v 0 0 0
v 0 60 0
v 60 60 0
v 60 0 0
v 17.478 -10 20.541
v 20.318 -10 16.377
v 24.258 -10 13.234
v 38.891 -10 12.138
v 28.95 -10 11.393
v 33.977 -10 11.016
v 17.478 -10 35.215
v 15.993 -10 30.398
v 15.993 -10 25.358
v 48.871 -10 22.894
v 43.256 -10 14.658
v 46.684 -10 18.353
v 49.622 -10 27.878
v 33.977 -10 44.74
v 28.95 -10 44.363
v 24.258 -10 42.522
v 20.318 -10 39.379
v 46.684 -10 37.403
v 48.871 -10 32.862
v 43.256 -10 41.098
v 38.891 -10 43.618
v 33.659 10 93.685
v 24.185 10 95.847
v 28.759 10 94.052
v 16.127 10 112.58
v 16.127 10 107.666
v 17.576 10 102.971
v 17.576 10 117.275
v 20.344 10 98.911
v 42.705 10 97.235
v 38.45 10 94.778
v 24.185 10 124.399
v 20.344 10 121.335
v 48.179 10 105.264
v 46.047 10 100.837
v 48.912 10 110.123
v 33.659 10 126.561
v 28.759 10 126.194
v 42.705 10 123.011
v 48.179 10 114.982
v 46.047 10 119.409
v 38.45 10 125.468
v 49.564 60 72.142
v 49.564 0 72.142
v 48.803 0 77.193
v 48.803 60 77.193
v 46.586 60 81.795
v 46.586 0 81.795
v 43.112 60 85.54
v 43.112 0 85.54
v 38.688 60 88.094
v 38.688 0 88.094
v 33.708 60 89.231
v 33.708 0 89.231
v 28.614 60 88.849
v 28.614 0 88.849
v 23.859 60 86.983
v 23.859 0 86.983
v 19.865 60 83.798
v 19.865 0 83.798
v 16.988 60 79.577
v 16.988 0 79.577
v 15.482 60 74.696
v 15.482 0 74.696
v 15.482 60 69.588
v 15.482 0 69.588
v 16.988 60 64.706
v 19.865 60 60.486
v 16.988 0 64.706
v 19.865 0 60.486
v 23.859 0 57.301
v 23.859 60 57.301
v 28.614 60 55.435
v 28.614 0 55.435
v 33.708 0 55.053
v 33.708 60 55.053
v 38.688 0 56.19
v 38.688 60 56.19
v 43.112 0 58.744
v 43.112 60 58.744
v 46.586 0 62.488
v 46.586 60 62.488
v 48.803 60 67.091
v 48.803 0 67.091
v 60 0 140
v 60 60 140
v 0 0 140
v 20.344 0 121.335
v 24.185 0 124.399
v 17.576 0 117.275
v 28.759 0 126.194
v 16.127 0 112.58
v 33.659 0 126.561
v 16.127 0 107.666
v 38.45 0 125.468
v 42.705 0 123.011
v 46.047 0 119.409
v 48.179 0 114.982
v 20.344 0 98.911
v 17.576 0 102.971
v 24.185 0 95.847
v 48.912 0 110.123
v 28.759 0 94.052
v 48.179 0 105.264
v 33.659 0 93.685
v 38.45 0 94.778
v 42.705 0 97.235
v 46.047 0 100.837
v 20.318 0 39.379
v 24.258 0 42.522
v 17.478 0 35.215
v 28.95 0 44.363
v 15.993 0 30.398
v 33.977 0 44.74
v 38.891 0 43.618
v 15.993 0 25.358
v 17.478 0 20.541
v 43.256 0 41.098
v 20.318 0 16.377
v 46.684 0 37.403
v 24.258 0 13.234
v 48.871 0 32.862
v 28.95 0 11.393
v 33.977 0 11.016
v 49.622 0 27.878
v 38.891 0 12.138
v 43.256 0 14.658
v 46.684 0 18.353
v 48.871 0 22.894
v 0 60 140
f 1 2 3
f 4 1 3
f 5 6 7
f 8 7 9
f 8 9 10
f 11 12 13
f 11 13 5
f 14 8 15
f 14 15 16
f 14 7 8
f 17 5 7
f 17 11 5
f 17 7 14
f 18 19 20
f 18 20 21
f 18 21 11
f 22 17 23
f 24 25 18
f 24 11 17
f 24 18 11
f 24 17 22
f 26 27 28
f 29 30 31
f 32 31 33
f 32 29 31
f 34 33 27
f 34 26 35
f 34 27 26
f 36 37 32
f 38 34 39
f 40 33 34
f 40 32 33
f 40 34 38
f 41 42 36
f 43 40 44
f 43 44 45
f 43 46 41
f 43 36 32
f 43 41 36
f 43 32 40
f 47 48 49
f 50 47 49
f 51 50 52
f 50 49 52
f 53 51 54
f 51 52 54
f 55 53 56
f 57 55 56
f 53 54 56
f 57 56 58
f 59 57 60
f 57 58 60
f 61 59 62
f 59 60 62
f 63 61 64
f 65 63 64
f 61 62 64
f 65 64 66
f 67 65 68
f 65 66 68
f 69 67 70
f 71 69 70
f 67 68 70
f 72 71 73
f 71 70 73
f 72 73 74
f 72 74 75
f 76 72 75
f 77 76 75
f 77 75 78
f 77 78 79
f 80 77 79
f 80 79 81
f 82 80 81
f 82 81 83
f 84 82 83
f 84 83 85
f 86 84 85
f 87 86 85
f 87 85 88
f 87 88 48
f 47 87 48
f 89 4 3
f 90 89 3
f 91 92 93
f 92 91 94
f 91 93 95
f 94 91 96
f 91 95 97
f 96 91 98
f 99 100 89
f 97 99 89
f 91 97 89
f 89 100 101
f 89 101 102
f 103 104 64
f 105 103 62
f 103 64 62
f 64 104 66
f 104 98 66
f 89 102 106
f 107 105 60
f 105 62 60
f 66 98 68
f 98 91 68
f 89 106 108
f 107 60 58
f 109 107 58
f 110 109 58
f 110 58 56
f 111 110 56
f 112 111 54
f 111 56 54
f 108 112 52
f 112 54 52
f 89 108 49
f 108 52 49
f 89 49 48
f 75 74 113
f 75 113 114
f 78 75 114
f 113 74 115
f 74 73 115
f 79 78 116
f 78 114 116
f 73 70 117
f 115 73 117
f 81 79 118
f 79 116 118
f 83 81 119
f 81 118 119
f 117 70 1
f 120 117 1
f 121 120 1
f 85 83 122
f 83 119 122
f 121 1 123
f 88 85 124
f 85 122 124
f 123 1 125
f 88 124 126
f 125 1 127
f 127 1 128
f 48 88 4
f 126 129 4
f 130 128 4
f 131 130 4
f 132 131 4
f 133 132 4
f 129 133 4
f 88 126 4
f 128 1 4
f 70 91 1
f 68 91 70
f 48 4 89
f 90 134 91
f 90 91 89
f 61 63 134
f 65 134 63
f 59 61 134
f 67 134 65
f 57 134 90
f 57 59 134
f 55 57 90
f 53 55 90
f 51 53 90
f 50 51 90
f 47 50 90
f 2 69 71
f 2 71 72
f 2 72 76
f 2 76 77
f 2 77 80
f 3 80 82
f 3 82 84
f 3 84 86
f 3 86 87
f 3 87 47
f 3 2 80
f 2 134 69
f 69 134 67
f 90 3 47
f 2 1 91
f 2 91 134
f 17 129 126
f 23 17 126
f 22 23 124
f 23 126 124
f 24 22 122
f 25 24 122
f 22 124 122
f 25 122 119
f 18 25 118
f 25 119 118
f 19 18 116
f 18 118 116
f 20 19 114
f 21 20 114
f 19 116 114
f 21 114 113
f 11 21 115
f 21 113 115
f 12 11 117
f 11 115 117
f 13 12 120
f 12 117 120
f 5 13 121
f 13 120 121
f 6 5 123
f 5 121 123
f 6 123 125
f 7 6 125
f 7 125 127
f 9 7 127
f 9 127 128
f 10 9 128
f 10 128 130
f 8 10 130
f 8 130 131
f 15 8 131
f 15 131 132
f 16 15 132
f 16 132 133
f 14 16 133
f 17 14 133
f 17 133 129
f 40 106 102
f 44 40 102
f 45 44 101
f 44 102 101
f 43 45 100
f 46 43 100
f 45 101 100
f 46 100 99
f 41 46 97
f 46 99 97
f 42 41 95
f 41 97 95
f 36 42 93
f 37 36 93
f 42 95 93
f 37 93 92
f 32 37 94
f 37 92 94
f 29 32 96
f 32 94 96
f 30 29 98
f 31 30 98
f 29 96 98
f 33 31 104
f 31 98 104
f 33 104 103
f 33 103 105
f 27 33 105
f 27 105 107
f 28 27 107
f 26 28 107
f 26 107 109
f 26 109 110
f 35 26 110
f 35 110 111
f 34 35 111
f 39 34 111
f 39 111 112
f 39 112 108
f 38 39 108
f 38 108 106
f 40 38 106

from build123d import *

# Parameters (mm, degrees)
F0_W     = 60
F0_H     = 60
F1_DEPTH = 140
F2_R     = 16.4842483895
F2_R_2   = 17.1367396553
F2_R_3   = 16.9091823749
F3_DEPTH = 15
F4_DEPTH = 199
F5_DEPTH = 25
F6_DEPTH = 5


with BuildPart() as f1:
    # F0 (on Top) → F1 (new body)
    with BuildSketch(Plane.XY):
        with Locations((30, 30)):
            Rectangle(F0_W, F0_H)
    extrude(amount=F1_DEPTH)

    # F2 (on face) → F3 (join)
    with BuildSketch(Plane.XZ):
        with Locations((32.427366823, 110.1229637861)):
            Circle(F2_R)
        with Locations((32.427366823, 72.1417963505)):
            Circle(F2_R_2)
        with Locations((32.7129401267, 27.8780274093)):
            Circle(F2_R_3)
    extrude(amount=F3_DEPTH)

    # F4 (cut): a face of the model
    f4_faces = [f1.faces().sort_by_distance(p)[0] for p in [
        (32.427366823, -15, 72.1417963505),
    ]]
    extrude(f4_faces, amount=-F4_DEPTH, mode=Mode.SUBTRACT)

    # F5 (cut): a face of the model
    f5_faces = [f1.faces().sort_by_distance(p)[0] for p in [
        (32.427366823, -15, 110.1229637861),
    ]]
    extrude(f5_faces, amount=-F5_DEPTH, mode=Mode.SUBTRACT)

    # F6 (cut): a face of the model
    f6_faces = [f1.faces().sort_by_distance(p)[0] for p in [
        (32.7129401267, -15, 27.8780274093),
    ]]
    extrude(f6_faces, amount=-F6_DEPTH, mode=Mode.SUBTRACT)


solid = f1.part
